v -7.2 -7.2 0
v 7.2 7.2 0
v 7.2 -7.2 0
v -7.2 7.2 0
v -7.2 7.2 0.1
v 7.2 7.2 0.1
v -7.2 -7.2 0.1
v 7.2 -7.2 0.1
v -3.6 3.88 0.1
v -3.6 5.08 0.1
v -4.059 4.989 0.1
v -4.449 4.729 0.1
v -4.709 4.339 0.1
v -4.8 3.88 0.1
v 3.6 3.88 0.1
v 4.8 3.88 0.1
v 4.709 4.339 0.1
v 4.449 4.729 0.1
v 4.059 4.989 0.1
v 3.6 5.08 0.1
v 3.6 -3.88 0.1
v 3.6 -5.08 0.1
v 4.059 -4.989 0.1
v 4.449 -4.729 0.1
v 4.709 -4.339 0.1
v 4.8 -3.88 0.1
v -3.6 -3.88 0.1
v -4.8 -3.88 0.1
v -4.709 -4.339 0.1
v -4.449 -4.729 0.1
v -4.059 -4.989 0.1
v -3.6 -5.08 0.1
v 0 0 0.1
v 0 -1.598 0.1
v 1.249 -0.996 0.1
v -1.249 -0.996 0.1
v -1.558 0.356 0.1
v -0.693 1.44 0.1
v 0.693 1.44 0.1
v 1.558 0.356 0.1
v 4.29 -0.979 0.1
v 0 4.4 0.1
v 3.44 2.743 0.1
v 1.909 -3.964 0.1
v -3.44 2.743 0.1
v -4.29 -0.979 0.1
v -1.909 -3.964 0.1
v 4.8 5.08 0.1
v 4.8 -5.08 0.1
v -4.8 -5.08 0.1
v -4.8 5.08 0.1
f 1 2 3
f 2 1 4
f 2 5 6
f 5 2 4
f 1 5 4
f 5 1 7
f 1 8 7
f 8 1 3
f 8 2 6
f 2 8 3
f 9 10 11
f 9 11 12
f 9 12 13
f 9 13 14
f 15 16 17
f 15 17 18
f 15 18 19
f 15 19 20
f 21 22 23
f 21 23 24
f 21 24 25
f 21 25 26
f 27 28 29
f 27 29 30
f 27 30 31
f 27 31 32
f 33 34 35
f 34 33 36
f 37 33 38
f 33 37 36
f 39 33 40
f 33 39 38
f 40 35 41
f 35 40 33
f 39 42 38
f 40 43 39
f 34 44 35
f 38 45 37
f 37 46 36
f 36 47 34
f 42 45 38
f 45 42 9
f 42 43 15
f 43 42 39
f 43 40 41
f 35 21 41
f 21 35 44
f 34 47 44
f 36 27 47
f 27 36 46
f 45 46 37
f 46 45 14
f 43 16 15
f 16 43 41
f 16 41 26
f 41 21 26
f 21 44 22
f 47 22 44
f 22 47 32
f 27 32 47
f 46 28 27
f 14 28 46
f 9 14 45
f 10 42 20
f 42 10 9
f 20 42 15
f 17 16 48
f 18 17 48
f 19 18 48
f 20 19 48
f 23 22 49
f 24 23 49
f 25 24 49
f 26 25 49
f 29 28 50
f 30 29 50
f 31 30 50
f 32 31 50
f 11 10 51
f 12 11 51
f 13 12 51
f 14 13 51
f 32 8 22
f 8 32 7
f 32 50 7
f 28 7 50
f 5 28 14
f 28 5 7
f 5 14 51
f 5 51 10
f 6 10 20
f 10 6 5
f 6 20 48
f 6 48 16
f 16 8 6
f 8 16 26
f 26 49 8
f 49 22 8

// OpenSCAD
// file: ../p/4-4edge.scad
use <../lib.scad>
$fa=1; $fs=0.2;
function ldraw_lib__4_4edge(realsolid=false) = [
// 0 Circle 1.0
// 0 Name: 4-4edge.dat
// 0 Author: James Jessiman
// 0 !LDRAW_ORG Primitive UPDATE 2017-01
// 0 !LICENSE Licensed under CC BY 2.0 and CC BY 4.0 : see CAreadme.txt
// 
// 0 BFC CERTIFY CCW
  [0,"BFC","CERTIFY"],
  [0,"BFC","CCW"],
// 
// 0 !HISTORY 1998-12-15 [PTadmin] Official Update 1998-10
// 0 !HISTORY 2005-12-28 [PTadmin] Official Update 2005-01
// 0 !HISTORY 2007-06-24 [PTadmin] Header formatted for Contributor Agreement
// 0 !HISTORY 2008-07-01 [PTadmin] Official Update 2008-01
// 0 !HISTORY 2017-01-15 [Steffen] BFCed
// 0 !HISTORY 2017-12-30 [PTadmin] Official Update 2017-01
// 
// 
// 2 24 1 0 0 0.9239 0 0.3827
  [2,24,1,0,0,0.9239,0,0.3827],
// 2 24 0.9239 0 0.3827 0.7071 0 0.7071
  [2,24,0.9239,0,0.3827,0.7071,0,0.7071],
// 2 24 0.7071 0 0.7071 0.3827 0 0.9239
  [2,24,0.7071,0,0.7071,0.3827,0,0.9239],
// 2 24 0.3827 0 0.9239 0 0 1
  [2,24,0.3827,0,0.9239,0,0,1],
// 2 24 0 0 1 -0.3827 0 0.9239
  [2,24,0,0,1,-0.3827,0,0.9239],
// 2 24 -0.3827 0 0.9239 -0.7071 0 0.7071
  [2,24,-0.3827,0,0.9239,-0.7071,0,0.7071],
// 2 24 -0.7071 0 0.7071 -0.9239 0 0.3827
  [2,24,-0.7071,0,0.7071,-0.9239,0,0.3827],
// 2 24 -0.9239 0 0.3827 -1 0 -0
  [2,24,-0.9239,0,0.3827,-1,0,-0],
// 2 24 -1 0 -0 -0.9239 0 -0.3827
  [2,24,-1,0,-0,-0.9239,0,-0.3827],
// 2 24 -0.9239 0 -0.3827 -0.7071 0 -0.7071
  [2,24,-0.9239,0,-0.3827,-0.7071,0,-0.7071],
// 2 24 -0.7071 0 -0.7071 -0.3827 0 -0.9239
  [2,24,-0.7071,0,-0.7071,-0.3827,0,-0.9239],
// 2 24 -0.3827 0 -0.9239 0 0 -1
  [2,24,-0.3827,0,-0.9239,0,0,-1],
// 2 24 0 0 -1 0.3827 0 -0.9239
  [2,24,0,0,-1,0.3827,0,-0.9239],
// 2 24 0.3827 0 -0.9239 0.7071 0 -0.7071
  [2,24,0.3827,0,-0.9239,0.7071,0,-0.7071],
// 2 24 0.7071 0 -0.7071 0.9239 0 -0.3827
  [2,24,0.7071,0,-0.7071,0.9239,0,-0.3827],
// 2 24 0.9239 0 -0.3827 1 0 0
  [2,24,0.9239,0,-0.3827,1,0,0],
];
module ldraw_lib__4_4edge(step=0, col=false, unit=2/5, alt=false, line=0.2, solid=!$preview)
    makepoly(ldraw_lib__4_4edge(solid), step=step, col=col, unit=unit, alt=alt, line=line, solid=solid);
ldraw_lib__4_4edge(line=0.2);
// file: ../p/4-4disc.scad
use <../lib.scad>
$fa=1; $fs=0.2;
function ldraw_lib__4_4disc(realsolid=false) = [
// 0 Disc 1.0
// 0 Name: 4-4disc.dat
// 0 Author: James Jessiman
// 0 !LDRAW_ORG Primitive UPDATE 2002-02
// 0 !LICENSE Licensed under CC BY 2.0 and CC BY 4.0 : see CAreadme.txt
// 
// 0 BFC CERTIFY CCW
  [0,"BFC","CERTIFY"],
  [0,"BFC","CCW"],
// 
// 0 !HISTORY 1998-12-15 [PTadmin] Official Update 1998-10
// 0 !HISTORY 2002-03-23 [sbliss] Added BFC statement
// 0 !HISTORY 2002-04-25 [PTadmin] Official Update 2002-02
// 0 !HISTORY 2007-06-24 [PTadmin] Header formatted for Contributor Agreement
// 0 !HISTORY 2008-07-01 [PTadmin] Official Update 2008-01
// 
// 
// 3 16 0 0 0 1 0 0 0.9239 0 0.3827
  [3,16,0,0,0,1,0,0,0.9239,0,0.3827],
// 3 16 0 0 0 0.9239 0 0.3827 0.7071 0 0.7071
  [3,16,0,0,0,0.9239,0,0.3827,0.7071,0,0.7071],
// 3 16 0 0 0 0.7071 0 0.7071 0.3827 0 0.9239
  [3,16,0,0,0,0.7071,0,0.7071,0.3827,0,0.9239],
// 3 16 0 0 0 0.3827 0 0.9239 0 0 1
  [3,16,0,0,0,0.3827,0,0.9239,0,0,1],
// 3 16 0 0 0 0 0 1 -0.3827 0 0.9239
  [3,16,0,0,0,0,0,1,-0.3827,0,0.9239],
// 3 16 0 0 0 -0.3827 0 0.9239 -0.7071 0 0.7071
  [3,16,0,0,0,-0.3827,0,0.9239,-0.7071,0,0.7071],
// 3 16 0 0 0 -0.7071 0 0.7071 -0.9239 0 0.3827
  [3,16,0,0,0,-0.7071,0,0.7071,-0.9239,0,0.3827],
// 3 16 0 0 0 -0.9239 0 0.3827 -1 0 -0
  [3,16,0,0,0,-0.9239,0,0.3827,-1,0,-0],
// 3 16 0 0 0 -1 0 -0 -0.9239 0 -0.3827
  [3,16,0,0,0,-1,0,-0,-0.9239,0,-0.3827],
// 3 16 0 0 0 -0.9239 0 -0.3827 -0.7071 0 -0.7071
  [3,16,0,0,0,-0.9239,0,-0.3827,-0.7071,0,-0.7071],
// 3 16 0 0 0 -0.7071 0 -0.7071 -0.3827 0 -0.9239
  [3,16,0,0,0,-0.7071,0,-0.7071,-0.3827,0,-0.9239],
// 3 16 0 0 0 -0.3827 0 -0.9239 0 0 -1
  [3,16,0,0,0,-0.3827,0,-0.9239,0,0,-1],
// 3 16 0 0 0 0 0 -1 0.3827 0 -0.9239
  [3,16,0,0,0,0,0,-1,0.3827,0,-0.9239],
// 3 16 0 0 0 0.3827 0 -0.9239 0.7071 0 -0.7071
  [3,16,0,0,0,0.3827,0,-0.9239,0.7071,0,-0.7071],
// 3 16 0 0 0 0.7071 0 -0.7071 0.9239 0 -0.3827
  [3,16,0,0,0,0.7071,0,-0.7071,0.9239,0,-0.3827],
// 3 16 0 0 0 0.9239 0 -0.3827 1 0 0
  [3,16,0,0,0,0.9239,0,-0.3827,1,0,0],
// 0
];
module ldraw_lib__4_4disc(step=0, col=false, unit=2/5, alt=false, line=0.2, solid=!$preview)
    makepoly(ldraw_lib__4_4disc(solid), step=step, col=col, unit=unit, alt=alt, line=line, solid=solid);
ldraw_lib__4_4disc(line=0.2);
// file: ../p/4-4cyli.scad
use <../lib.scad>
$fa=1; $fs=0.2;
function ldraw_lib__4_4cyli(realsolid=false) = [
// 0 Cylinder 1.0
// 0 Name: 4-4cyli.dat
// 0 Author: James Jessiman
// 0 !LDRAW_ORG Primitive UPDATE 2005-01
// 0 !LICENSE Licensed under CC BY 2.0 and CC BY 4.0 : see CAreadme.txt
// 
// 0 BFC CERTIFY CCW
  [0,"BFC","CERTIFY"],
  [0,"BFC","CCW"],
// 
// 0 !HISTORY 1998-12-15 [PTadmin] Official Update 1998-10
// 0 !HISTORY 2002-03-23 [sbliss] Added BFC statement; merged headers from files in distributions LDraw 0.27 and Complete.
// 0 !HISTORY 2002-04-25 [PTadmin] Official Update 2002-02
// 0 !HISTORY 2004-12-14 [guyvivan] BFC CCW
// 0 !HISTORY 2005-12-28 [PTadmin] Official Update 2005-01
// 0 !HISTORY 2007-06-24 [PTadmin] Header formatted for Contributor Agreement
// 0 !HISTORY 2008-07-01 [PTadmin] Official Update 2008-01
// 
// 
// 4 16 1 1 0 0.9239 1 0.3827 0.9239 0 0.3827 1 0 0
  [4,16,1,1,0,0.9239,1,0.3827,0.9239,0,0.3827,1,0,0],
// 5 24 1 0 0 1 1 0 0.9239 0 0.3827 0.9239 0 -0.3827
  [5,24,1,0,0,1,1,0,0.9239,0,0.3827,0.9239,0,-0.3827],
// 4 16 0.9239 1 0.3827 0.7071 1 0.7071 0.7071 0 0.7071 0.9239 0 0.3827
  [4,16,0.9239,1,0.3827,0.7071,1,0.7071,0.7071,0,0.7071,0.9239,0,0.3827],
// 5 24 0.9239 0 0.3827 0.9239 1 0.3827 0.7071 0 0.7071 1 0 0
  [5,24,0.9239,0,0.3827,0.9239,1,0.3827,0.7071,0,0.7071,1,0,0],
// 4 16 0.7071 1 0.7071 0.3827 1 0.9239 0.3827 0 0.9239 0.7071 0 0.7071
  [4,16,0.7071,1,0.7071,0.3827,1,0.9239,0.3827,0,0.9239,0.7071,0,0.7071],
// 5 24 0.7071 0 0.7071 0.7071 1 0.7071 0.3827 0 0.9239 0.9239 0 0.3827
  [5,24,0.7071,0,0.7071,0.7071,1,0.7071,0.3827,0,0.9239,0.9239,0,0.3827],
// 4 16 0.3827 1 0.9239 0 1 1 0 0 1 0.3827 0 0.9239
  [4,16,0.3827,1,0.9239,0,1,1,0,0,1,0.3827,0,0.9239],
// 5 24 0.3827 0 0.9239 0.3827 1 0.9239 0 0 1 0.7071 0 0.7071
  [5,24,0.3827,0,0.9239,0.3827,1,0.9239,0,0,1,0.7071,0,0.7071],
// 4 16 0 1 1 -0.3827 1 0.9239 -0.3827 0 0.9239 0 0 1
  [4,16,0,1,1,-0.3827,1,0.9239,-0.3827,0,0.9239,0,0,1],
// 5 24 0 0 1 0 1 1 -0.3827 0 0.9239 0.3827 0 0.9239
  [5,24,0,0,1,0,1,1,-0.3827,0,0.9239,0.3827,0,0.9239],
// 4 16 -0.3827 1 0.9239 -0.7071 1 0.7071 -0.7071 0 0.7071 -0.3827 0 0.9239
  [4,16,-0.3827,1,0.9239,-0.7071,1,0.7071,-0.7071,0,0.7071,-0.3827,0,0.9239],
// 5 24 -0.3827 0 0.9239 -0.3827 1 0.9239 -0.7071 0 0.7071 0 0 1
  [5,24,-0.3827,0,0.9239,-0.3827,1,0.9239,-0.7071,0,0.7071,0,0,1],
// 4 16 -0.7071 1 0.7071 -0.9239 1 0.3827 -0.9239 0 0.3827 -0.7071 0 0.7071
  [4,16,-0.7071,1,0.7071,-0.9239,1,0.3827,-0.9239,0,0.3827,-0.7071,0,0.7071],
// 5 24 -0.7071 0 0.7071 -0.7071 1 0.7071 -0.9239 0 0.3827 -0.3827 0 0.9239
  [5,24,-0.7071,0,0.7071,-0.7071,1,0.7071,-0.9239,0,0.3827,-0.3827,0,0.9239],
// 4 16 -0.9239 1 0.3827 -1 1 0 -1 0 0 -0.9239 0 0.3827
  [4,16,-0.9239,1,0.3827,-1,1,0,-1,0,0,-0.9239,0,0.3827],
// 5 24 -0.9239 0 0.3827 -0.9239 1 0.3827 -1 0 0 -0.7071 0 0.7071
  [5,24,-0.9239,0,0.3827,-0.9239,1,0.3827,-1,0,0,-0.7071,0,0.7071],
// 4 16 -1 1 0 -0.9239 1 -0.3827 -0.9239 0 -0.3827 -1 0 0
  [4,16,-1,1,0,-0.9239,1,-0.3827,-0.9239,0,-0.3827,-1,0,0],
// 5 24 -1 0 0 -1 1 0 -0.9239 0 -0.3827 -0.9239 0 0.3827
  [5,24,-1,0,0,-1,1,0,-0.9239,0,-0.3827,-0.9239,0,0.3827],
// 4 16 -0.9239 1 -0.3827 -0.7071 1 -0.7071 -0.7071 0 -0.7071 -0.9239 0 -0.3827
  [4,16,-0.9239,1,-0.3827,-0.7071,1,-0.7071,-0.7071,0,-0.7071,-0.9239,0,-0.3827],
// 5 24 -0.9239 0 -0.3827 -0.9239 1 -0.3827 -0.7071 0 -0.7071 -1 0 0
  [5,24,-0.9239,0,-0.3827,-0.9239,1,-0.3827,-0.7071,0,-0.7071,-1,0,0],
// 4 16 -0.7071 1 -0.7071 -0.3827 1 -0.9239 -0.3827 0 -0.9239 -0.7071 0 -0.7071
  [4,16,-0.7071,1,-0.7071,-0.3827,1,-0.9239,-0.3827,0,-0.9239,-0.7071,0,-0.7071],
// 5 24 -0.7071 0 -0.7071 -0.7071 1 -0.7071 -0.3827 0 -0.9239 -0.9239 0 -0.3827
  [5,24,-0.7071,0,-0.7071,-0.7071,1,-0.7071,-0.3827,0,-0.9239,-0.9239,0,-0.3827],
// 4 16 -0.3827 1 -0.9239 0 1 -1 0 0 -1 -0.3827 0 -0.9239
  [4,16,-0.3827,1,-0.9239,0,1,-1,0,0,-1,-0.3827,0,-0.9239],
// 5 24 -0.3827 0 -0.9239 -0.3827 1 -0.9239 0 0 -1 -0.7071 0 -0.7071
  [5,24,-0.3827,0,-0.9239,-0.3827,1,-0.9239,0,0,-1,-0.7071,0,-0.7071],
// 4 16 0 1 -1 0.3827 1 -0.9239 0.3827 0 -0.9239 0 0 -1
  [4,16,0,1,-1,0.3827,1,-0.9239,0.3827,0,-0.9239,0,0,-1],
// 5 24 0 0 -1 0 1 -1 0.3827 0 -0.9239 -0.3827 0 -0.9239
  [5,24,0,0,-1,0,1,-1,0.3827,0,-0.9239,-0.3827,0,-0.9239],
// 4 16 0.3827 1 -0.9239 0.7071 1 -0.7071 0.7071 0 -0.7071 0.3827 0 -0.9239
  [4,16,0.3827,1,-0.9239,0.7071,1,-0.7071,0.7071,0,-0.7071,0.3827,0,-0.9239],
// 5 24 0.3827 0 -0.9239 0.3827 1 -0.9239 0.7071 0 -0.7071 0 0 -1
  [5,24,0.3827,0,-0.9239,0.3827,1,-0.9239,0.7071,0,-0.7071,0,0,-1],
// 4 16 0.7071 1 -0.7071 0.9239 1 -0.3827 0.9239 0 -0.3827 0.7071 0 -0.7071
  [4,16,0.7071,1,-0.7071,0.9239,1,-0.3827,0.9239,0,-0.3827,0.7071,0,-0.7071],
// 5 24 0.7071 0 -0.7071 0.7071 1 -0.7071 0.9239 0 -0.3827 0.3827 0 -0.9239
  [5,24,0.7071,0,-0.7071,0.7071,1,-0.7071,0.9239,0,-0.3827,0.3827,0,-0.9239],
// 4 16 0.9239 1 -0.3827 1 1 0 1 0 0 0.9239 0 -0.3827
  [4,16,0.9239,1,-0.3827,1,1,0,1,0,0,0.9239,0,-0.3827],
// 5 24 0.9239 0 -0.3827 0.9239 1 -0.3827 1 0 0 0.7071 0 -0.7071
  [5,24,0.9239,0,-0.3827,0.9239,1,-0.3827,1,0,0,0.7071,0,-0.7071],
// 0
];
module ldraw_lib__4_4cyli(step=0, col=false, unit=2/5, alt=false, line=0.2, solid=!$preview)
    makepoly(ldraw_lib__4_4cyli(solid), step=step, col=col, unit=unit, alt=alt, line=line, solid=solid);
ldraw_lib__4_4cyli(line=0.2);
// file: ../p/stud3.scad
use <../lib.scad>
use <4-4cyli.scad>
use <4-4disc.scad>
use <4-4edge.scad>
$fa=1; $fs=0.2;
function ldraw_lib__stud3(realsolid=false) = realsolid ? 
    [openscad(translate([0,0,-eps()], o=cylinder(4+eps(), r=4)),2)] : [
// 0 Stud Tube Solid
// 0 Name: stud3.dat
// 0 Author: James Jessiman
// 0 !LDRAW_ORG Primitive UPDATE 2012-01
// 0 !LICENSE Licensed under CC BY 2.0 and CC BY 4.0 : see CAreadme.txt
// 
// 0 BFC CERTIFY CCW
  [0,"BFC","CERTIFY"],
  [0,"BFC","CCW"],
// 
// 0 !HISTORY 2002-04-04 [sbliss] Modified for BFC compliance
// 0 !HISTORY 2002-04-25 [PTadmin] Official Update 2002-02
// 0 !HISTORY 2007-06-24 [PTadmin] Header formatted for Contributor Agreement
// 0 !HISTORY 2008-07-01 [PTadmin] Official Update 2008-01
// 0 !HISTORY 2012-02-16 [Philo] Changed to CCW
// 0 !HISTORY 2012-03-30 [PTadmin] Official Update 2012-01
// 
// 
// 1 16 0 -4 0 4 0 0 0 1 0 0 0 4 4-4edge.dat
  [1,16,0,-4,0,4,0,0,0,1,0,0,0,4, ldraw_lib__4_4edge(realsolid)],
// 1 16 0 0 0 4 0 0 0 1 0 0 0 4 4-4edge.dat
  [1,16,0,0,0,4,0,0,0,1,0,0,0,4, ldraw_lib__4_4edge(realsolid)],
// 1 16 0 -4 0 4 0 0 0 1 0 0 0 4 4-4disc.dat
  [1,16,0,-4,0,4,0,0,0,1,0,0,0,4, ldraw_lib__4_4disc(realsolid)],
// 1 16 0 -4 0 4 0 0 0 4 0 0 0 4 4-4cyli.dat
  [1,16,0,-4,0,4,0,0,0,4,0,0,0,4, ldraw_lib__4_4cyli(realsolid)],
];
module ldraw_lib__stud3(step=0, col=false, unit=2/5, alt=false, line=0.2, solid=!$preview)
    makepoly(ldraw_lib__stud3(solid), step=step, col=col, unit=unit, alt=alt, line=line, solid=solid);
ldraw_lib__stud3(line=0.2);
// file: ../p/stud.scad
use <../lib.scad>
use <4-4cyli.scad>
use <4-4disc.scad>
use <4-4edge.scad>
$fa=1; $fs=0.2;
function ldraw_lib__stud(realsolid=false) = realsolid ? 
    [openscad(translate([0,0,-eps()], o=cylinder(4+eps(), r=6)),2)] : [
// 0 Stud
// 0 Name: stud.dat
// 0 Author: James Jessiman
// 0 !LDRAW_ORG Primitive UPDATE 2012-01
// 0 !LICENSE Licensed under CC BY 2.0 and CC BY 4.0 : see CAreadme.txt
// 
// 0 BFC CERTIFY CCW
  [0,"BFC","CERTIFY"],
  [0,"BFC","CCW"],
// 
// 0 !HISTORY 2002-04-04 [sbliss] Modified for BFC compliance
// 0 !HISTORY 2002-04-25 [PTadmin] Official Update 2002-02
// 0 !HISTORY 2007-06-24 [PTadmin] Header formatted for Contributor Agreement
// 0 !HISTORY 2008-07-01 [PTadmin] Official Update 2008-01
// 0 !HISTORY 2012-02-16 [Philo] Changed to CCW
// 0 !HISTORY 2012-03-30 [PTadmin] Official Update 2012-01
// 
// 
// 1 16 0 0 0 6 0 0 0 1 0 0 0 6 4-4edge.dat
  [1,16,0,0,0,6,0,0,0,1,0,0,0,6, ldraw_lib__4_4edge(realsolid)],
// 1 16 0 -4 0 6 0 0 0 1 0 0 0 6 4-4edge.dat
  [1,16,0,-4,0,6,0,0,0,1,0,0,0,6, ldraw_lib__4_4edge(realsolid)],
// 1 16 0 0 0 6 0 0 0 -4 0 0 0 6 4-4cyli.dat
  [1,16,0,0,0,6,0,0,0,-4,0,0,0,6, ldraw_lib__4_4cyli(realsolid)],
// 1 16 0 -4 0 6 0 0 0 1 0 0 0 6 4-4disc.dat
  [1,16,0,-4,0,6,0,0,0,1,0,0,0,6, ldraw_lib__4_4disc(realsolid)],
];
module ldraw_lib__stud(step=0, col=false, unit=2/5, alt=false, line=0.2, solid=!$preview)
    makepoly(ldraw_lib__stud(solid), step=step, col=col, unit=unit, alt=alt, line=line, solid=solid);
ldraw_lib__stud(line=0.2);
// file: ../p/box5.scad
use <../lib.scad>
$fa=1; $fs=0.2;
function ldraw_lib__box5(realsolid=false) = [
// 0 Box with 5 Faces and All Edges
// 0 Name: box5.dat
// 0 Author: James Jessiman
// 0 !LDRAW_ORG Primitive UPDATE 2012-01
// 0 !LICENSE Licensed under CC BY 2.0 and CC BY 4.0 : see CAreadme.txt
// 
// 0 BFC CERTIFY CCW
  [0,"BFC","CERTIFY"],
  [0,"BFC","CCW"],
// 
// 0 !HISTORY 2002-04-03 [sbliss] Modified for BFC compliance
// 0 !HISTORY 2002-04-25 [PTadmin] Official Update 2002-02
// 0 !HISTORY 2007-06-24 [PTadmin] Header formatted for Contributor Agreement
// 0 !HISTORY 2008-07-01 [PTadmin] Official Update 2008-01
// 0 !HISTORY 2012-02-16 [Philo] Changed to CCW
// 0 !HISTORY 2012-03-30 [PTadmin] Official Update 2012-01
// 
// 
// 2 24 1 1 1 -1 1 1
  [2,24,1,1,1,-1,1,1],
// 2 24 -1 1 1 -1 1 -1
  [2,24,-1,1,1,-1,1,-1],
// 2 24 -1 1 -1 1 1 -1
  [2,24,-1,1,-1,1,1,-1],
// 2 24 1 1 -1 1 1 1
  [2,24,1,1,-1,1,1,1],
// 2 24 1 0 1 -1 0 1
  [2,24,1,0,1,-1,0,1],
// 2 24 -1 0 1 -1 0 -1
  [2,24,-1,0,1,-1,0,-1],
// 2 24 -1 0 -1 1 0 -1
  [2,24,-1,0,-1,1,0,-1],
// 2 24 1 0 -1 1 0 1
  [2,24,1,0,-1,1,0,1],
// 2 24 1 0 1 1 1 1
  [2,24,1,0,1,1,1,1],
// 2 24 -1 0 1 -1 1 1
  [2,24,-1,0,1,-1,1,1],
// 2 24 1 0 -1 1 1 -1
  [2,24,1,0,-1,1,1,-1],
// 2 24 -1 0 -1 -1 1 -1
  [2,24,-1,0,-1,-1,1,-1],
// 4 16 -1 1 1 1 1 1 1 1 -1 -1 1 -1
  [4,16,-1,1,1,1,1,1,1,1,-1,-1,1,-1],
// 4 16 -1 1 1 -1 0 1 1 0 1 1 1 1
  [4,16,-1,1,1,-1,0,1,1,0,1,1,1,1],
// 4 16 -1 1 -1 -1 0 -1 -1 0 1 -1 1 1
  [4,16,-1,1,-1,-1,0,-1,-1,0,1,-1,1,1],
// 4 16 1 1 -1 1 0 -1 -1 0 -1 -1 1 -1
  [4,16,1,1,-1,1,0,-1,-1,0,-1,-1,1,-1],
// 4 16 1 1 1 1 0 1 1 0 -1 1 1 -1
  [4,16,1,1,1,1,0,1,1,0,-1,1,1,-1],
];
module ldraw_lib__box5(step=0, col=false, unit=2/5, alt=false, line=0.2, solid=!$preview)
    makepoly(ldraw_lib__box5(solid), step=step, col=col, unit=unit, alt=alt, line=line, solid=solid);
ldraw_lib__box5(line=0.2);
// file: ../p/box4t.scad
use <../lib.scad>
$fa=1; $fs=0.2;
function ldraw_lib__box4t(realsolid=false) = [
// 0 Box with 4 Adjacent Faces and All Edges
// 0 Name: box4t.dat
// 0 Author: Tore Eriksson [Tore_Eriksson]
// 0 !LDRAW_ORG Primitive UPDATE 2003-02
// 0 !LICENSE Licensed under CC BY 2.0 and CC BY 4.0 : see CAreadme.txt
// 
// 0 BFC CERTIFY CCW
  [0,"BFC","CERTIFY"],
  [0,"BFC","CCW"],
// 
// 0 !HISTORY 1997-09-29 [PTadmin] Official Update 1997-15
// 0 !HISTORY 2002-08-31 [izanette] Modified with WINDZ for BFC compliance
// 0 !HISTORY 2003-08-01 [PTadmin] Official Update 2003-02
// 0 !HISTORY 2007-06-24 [PTadmin] Header formatted for Contributor Agreement
// 0 !HISTORY 2008-07-01 [PTadmin] Official Update 2008-01
// 
// 
// 2 24 1 1 1 -1 1 1
  [2,24,1,1,1,-1,1,1],
// 2 24 -1 1 1 -1 1 -1
  [2,24,-1,1,1,-1,1,-1],
// 2 24 -1 1 -1 1 1 -1
  [2,24,-1,1,-1,1,1,-1],
// 2 24 1 1 -1 1 1 1
  [2,24,1,1,-1,1,1,1],
// 2 24 1 0 1 -1 0 1
  [2,24,1,0,1,-1,0,1],
// 2 24 -1 0 1 -1 0 -1
  [2,24,-1,0,1,-1,0,-1],
// 2 24 -1 0 -1 1 0 -1
  [2,24,-1,0,-1,1,0,-1],
// 2 24 1 0 -1 1 0 1
  [2,24,1,0,-1,1,0,1],
// 2 24 1 0 1 1 1 1
  [2,24,1,0,1,1,1,1],
// 2 24 -1 0 1 -1 1 1
  [2,24,-1,0,1,-1,1,1],
// 2 24 1 0 -1 1 1 -1
  [2,24,1,0,-1,1,1,-1],
// 2 24 -1 0 -1 -1 1 -1
  [2,24,-1,0,-1,-1,1,-1],
// 4 16 1 1 1 1 1 -1 -1 1 -1 -1 1 1
  [4,16,1,1,1,1,1,-1,-1,1,-1,-1,1,1],
// 4 16 1 1 1 -1 1 1 -1 0 1 1 0 1
  [4,16,1,1,1,-1,1,1,-1,0,1,1,0,1],
// 4 16 -1 1 1 -1 1 -1 -1 0 -1 -1 0 1
  [4,16,-1,1,1,-1,1,-1,-1,0,-1,-1,0,1],
// 0 4 16 -1 1 -1 -1 0 -1 1 0 -1 1 1 -1
// 4 16 1 1 -1 1 1 1 1 0 1 1 0 -1
  [4,16,1,1,-1,1,1,1,1,0,1,1,0,-1],
// 0
];
module ldraw_lib__box4t(step=0, col=false, unit=2/5, alt=false, line=0.2, solid=!$preview)
    makepoly(ldraw_lib__box4t(solid), step=step, col=col, unit=unit, alt=alt, line=line, solid=solid);
ldraw_lib__box4t(line=0.2);
// file: s/3004s01.scad
use <../../lib.scad>
use <../../p/box4t.scad>
use <../../p/box5.scad>
use <../../p/stud.scad>
use <../../p/stud3.scad>
$fa=1; $fs=0.2;
function ldraw_lib__s__3004s01(realsolid=false) = [
// 0 ~Brick  1 x  2 without Front Face
// 0 Name: s\3004s01.dat
// 0 Author: James Jessiman
// 0 !LDRAW_ORG Subpart UPDATE 2003-03
// 0 !LICENSE Licensed under CC BY 2.0 and CC BY 4.0 : see CAreadme.txt
// 
// 0 BFC CERTIFY CCW
  [0,"BFC","CERTIFY"],
  [0,"BFC","CCW"],
// 
// 0 !HISTORY 2003-09-07 [jriley] Subfiling, BFC
// 0 !HISTORY 2003-12-19 [PTadmin] Official Update 2003-03
// 0 !HISTORY 2007-08-29 [PTadmin] Header formatted for Contributor Agreement
// 0 !HISTORY 2008-07-01 [PTadmin] Official Update 2008-01
// 
// 
// 1 16 0 4 0 1 0 0 0 -5 0 0 0 1 stud3.dat
  [1,16,0,4,0,1,0,0,0,-5,0,0,0,1, ldraw_lib__stud3(realsolid)],
// 0 BFC INVERTNEXT
  [0,"BFC","INVERTNEXT"],
// 1 16 0 24 0 16 0 0 0 -20 0 0 0 6 box5.dat
  [1,16,0,24,0,16,0,0,0,-20,0,0,0,6, ldraw_lib__box5(realsolid)],
// 4 16 20 24 10 16 24 6 -16 24 6 -20 24 10
  [4,16,20,24,10,16,24,6,-16,24,6,-20,24,10],
// 4 16 -20 24 10 -16 24 6 -16 24 -6 -20 24 -10
  [4,16,-20,24,10,-16,24,6,-16,24,-6,-20,24,-10],
// 4 16 -20 24 -10 -16 24 -6 16 24 -6 20 24 -10
  [4,16,-20,24,-10,-16,24,-6,16,24,-6,20,24,-10],
// 4 16 20 24 -10 16 24 -6 16 24 6 20 24 10
  [4,16,20,24,-10,16,24,-6,16,24,6,20,24,10],
// 1 16 0 24 0 20 0 0 0 -24 0 0 0 10 box4t.dat
  [1,16,0,24,0,20,0,0,0,-24,0,0,0,10, ldraw_lib__box4t(realsolid)],
// 1 16 10 0 0 1 0 0 0 1 0 0 0 1 stud.dat
  [1,16,10,0,0,1,0,0,0,1,0,0,0,1, ldraw_lib__stud(realsolid)],
// 1 16 -10 0 0 1 0 0 0 1 0 0 0 1 stud.dat
  [1,16,-10,0,0,1,0,0,0,1,0,0,0,1, ldraw_lib__stud(realsolid)],
// 0
];
module ldraw_lib__s__3004s01(step=0, col=false, unit=2/5, alt=false, line=0.2, solid=!$preview)
    makepoly(ldraw_lib__s__3004s01(solid), step=step, col=col, unit=unit, alt=alt, line=line, solid=solid);
ldraw_lib__s__3004s01(line=0.2);
// file: ../p/1-4ndis.scad
use <../lib.scad>
$fa=1; $fs=0.2;
function ldraw_lib__1_4ndis(realsolid=false) = [
// 0 Disc Negative 0.25
// 0 Name: 1-4ndis.dat
// 0 Author: James Jessiman
// 0 !LDRAW_ORG Primitive UPDATE 2012-01
// 0 !LICENSE Licensed under CC BY 2.0 and CC BY 4.0 : see CAreadme.txt
// 
// 0 BFC CERTIFY CCW
  [0,"BFC","CERTIFY"],
  [0,"BFC","CCW"],
// 
// 0 !HISTORY 2002-03-23 [sbliss] Added BFC Statement
// 0 !HISTORY 2002-04-25 [PTadmin] Official Update 2002-02
// 0 !HISTORY 2007-06-22 [PTadmin] Header formatted for Contributor Agreement
// 0 !HISTORY 2008-07-01 [PTadmin] Official Update 2008-01
// 0 !HISTORY 2012-02-16 [Philo] Changed to CCW
// 0 !HISTORY 2012-03-30 [PTadmin] Official Update 2012-01
// 
// 
// 3 16 0.9239 0 0.3827 1 0 0 1 0 1
  [3,16,0.9239,0,0.3827,1,0,0,1,0,1],
// 3 16 0.7071 0 0.7071 0.9239 0 0.3827 1 0 1
  [3,16,0.7071,0,0.7071,0.9239,0,0.3827,1,0,1],
// 3 16 0.3827 0 0.9239 0.7071 0 0.7071 1 0 1
  [3,16,0.3827,0,0.9239,0.7071,0,0.7071,1,0,1],
// 3 16 0 0 1 0.3827 0 0.9239 1 0 1
  [3,16,0,0,1,0.3827,0,0.9239,1,0,1],
];
module ldraw_lib__1_4ndis(step=0, col=false, unit=2/5, alt=false, line=0.2, solid=!$preview)
    makepoly(ldraw_lib__1_4ndis(solid), step=step, col=col, unit=unit, alt=alt, line=line, solid=solid);
ldraw_lib__1_4ndis(line=0.2);
// file: ../p/1-4disc.scad
use <../lib.scad>
$fa=1; $fs=0.2;
function ldraw_lib__1_4disc(realsolid=false) = [
// 0 Disc 0.25
// 0 Name: 1-4disc.dat
// 0 Author: James Jessiman
// 0 !LDRAW_ORG Primitive UPDATE 2002-02
// 0 !LICENSE Licensed under CC BY 2.0 and CC BY 4.0 : see CAreadme.txt
// 
// 0 BFC CERTIFY CCW
  [0,"BFC","CERTIFY"],
  [0,"BFC","CCW"],
// 
// 0 !HISTORY 2002-03-23 [sbliss] Added BFC statement.
// 0 !HISTORY 2002-04-25 [PTadmin] Official Update 2002-02
// 0 !HISTORY 2007-06-22 [PTadmin] Header formatted for Contributor Agreement
// 0 !HISTORY 2008-07-01 [PTadmin] Official Update 2008-01
// 
// 
// 3 16 0 0 0 1 0 0 0.9239 0 0.3827
  [3,16,0,0,0,1,0,0,0.9239,0,0.3827],
// 3 16 0 0 0 0.9239 0 0.3827 0.7071 0 0.7071
  [3,16,0,0,0,0.9239,0,0.3827,0.7071,0,0.7071],
// 3 16 0 0 0 0.7071 0 0.7071 0.3827 0 0.9239
  [3,16,0,0,0,0.7071,0,0.7071,0.3827,0,0.9239],
// 3 16 0 0 0 0.3827 0 0.9239 0 0 1
  [3,16,0,0,0,0.3827,0,0.9239,0,0,1],
// 0
];
module ldraw_lib__1_4disc(step=0, col=false, unit=2/5, alt=false, line=0.2, solid=!$preview)
    makepoly(ldraw_lib__1_4disc(solid), step=step, col=col, unit=unit, alt=alt, line=line, solid=solid);
ldraw_lib__1_4disc(line=0.2);
// file: 3004.scad
use <../lib.scad>
use <s/3004s01.scad>
$fa=1; $fs=0.2;
function ldraw_lib__3004(realsolid=false) = [
// 0 Brick  1 x  2
// 0 Name: 3004.dat
// 0 Author: James Jessiman
// 0 !LDRAW_ORG Part UPDATE 2022-05
// 0 !LICENSE Licensed under CC BY 2.0 and CC BY 4.0 : see CAreadme.txt
// 
// 0 BFC CERTIFY CCW
  [0,"BFC","CERTIFY"],
  [0,"BFC","CCW"],
// 
// 0 !HISTORY 2001-10-26 [PTadmin] Official Update 2001-01
// 0 !HISTORY 2002-05-07 {unknown} BFC Certification
// 0 !HISTORY 2002-06-11 [PTadmin] Official Update 2002-03
// 0 !HISTORY 2007-05-07 [PTadmin] Header formatted for Contributor Agreement
// 0 !HISTORY 2008-07-01 [PTadmin] Official Update 2008-01
// 0 !HISTORY 2022-08-04 [MagFors] Using subfile
// 0 !HISTORY 2022-09-15 [PTadmin] Official Update 2022-05
// 
// 
// 1 16 0 0 0 1 0 0 0 1 0 0 0 1 s\3004s01.dat
  [1,16,0,0,0,1,0,0,0,1,0,0,0,1, ldraw_lib__s__3004s01(realsolid)],
// 4 16 -20 24 -10 20 24 -10 20 0 -10 -20 0 -10
  [4,16,-20,24,-10,20,24,-10,20,0,-10,-20,0,-10],
];
module ldraw_lib__3004(step=0, col=false, unit=2/5, alt=false, line=0.2, solid=!$preview)
    makepoly(ldraw_lib__3004(solid), step=step, col=col, unit=unit, alt=alt, line=line, solid=solid);
ldraw_lib__3004(line=0.2);
// file: s/4616559ps1.scad
use <../../lib.scad>
use <../../p/1-4disc.scad>
use <../../p/1-4ndis.scad>
$fa=1; $fs=0.2;
function ldraw_lib__s__4616559ps1(realsolid=false) = [
// 0 ~Sticker Maersk Logo
// 0 Name: s\4616559ps1.dat
// 0 Author: J.C. Tchang [tchang]
// 0 !LDRAW_ORG Subpart UPDATE 2013-01
// 0 !LICENSE Licensed under CC BY 2.0 and CC BY 4.0 : see CAreadme.txt
// 
// 0 BFC CERTIFY CCW
  [0,"BFC","CERTIFY"],
  [0,"BFC","CCW"],
// 
// 0 !HISTORY 2013-07-21 [PTadmin] Official Update 2013-01
// 
// 
// 1 313 -9 0 9.7 0 0 -3 0 1 0 3 0 0 1-4disc.dat
  [1,313,-9,0,9.7,0,0,-3,0,1,0,3,0,0, ldraw_lib__1_4disc(realsolid)],
// 1 313 9 0 9.7 3 0 0 0 1 0 0 0 3 1-4disc.dat
  [1,313,9,0,9.7,3,0,0,0,1,0,0,0,3, ldraw_lib__1_4disc(realsolid)],
// 1 313 9 0 -9.7 0 0 3 0 1 0 -3 0 0 1-4disc.dat
  [1,313,9,0,-9.7,0,0,3,0,1,0,-3,0,0, ldraw_lib__1_4disc(realsolid)],
// 1 313 -9 0 -9.7 -3 0 0 0 1 0 0 0 -3 1-4disc.dat
  [1,313,-9,0,-9.7,-3,0,0,0,1,0,0,0,-3, ldraw_lib__1_4disc(realsolid)],
// 0 //
// 4 15 0 0 -3.994 3.123 0 -2.49 0 0 0 -3.123 0 -2.49
  [4,15,0,0,-3.994,3.123,0,-2.49,0,0,0,-3.123,0,-2.49],
// 4 15 -3.894 0 0.889 -3.123 0 -2.49 0 0 0 -1.733 0 3.599
  [4,15,-3.894,0,0.889,-3.123,0,-2.49,0,0,0,-1.733,0,3.599],
// 4 15 1.733 0 3.599 -1.733 0 3.599 0 0 0 3.894 0 0.889
  [4,15,1.733,0,3.599,-1.733,0,3.599,0,0,0,3.894,0,0.889],
// 4 15 3.894 0 0.889 0 0 0 3.123 0 -2.49 10.724 0 -2.448
  [4,15,3.894,0,0.889,0,0,0,3.123,0,-2.49,10.724,0,-2.448],
// 3 15 1.733 0 3.599 0 0 11 -1.733 0 3.599
  [3,15,1.733,0,3.599,0,0,11,-1.733,0,3.599],
// 3 15 3.894 0 0.889 8.6 0 6.858 1.733 0 3.599
  [3,15,3.894,0,0.889,8.6,0,6.858,1.733,0,3.599],
// 3 15 0 0 -3.994 4.773 0 -9.911 3.123 0 -2.49
  [3,15,0,0,-3.994,4.773,0,-9.911,3.123,0,-2.49],
// 3 15 -1.733 0 3.599 -8.6 0 6.858 -3.894 0 0.889
  [3,15,-1.733,0,3.599,-8.6,0,6.858,-3.894,0,0.889],
// 3 15 -3.894 0 0.889 -10.724 0 -2.448 -3.123 0 -2.49
  [3,15,-3.894,0,0.889,-10.724,0,-2.448,-3.123,0,-2.49],
// 3 15 -3.123 0 -2.49 -4.773 0 -9.911 0 0 -3.994
  [3,15,-3.123,0,-2.49,-4.773,0,-9.911,0,0,-3.994],
// 0 //
// 4 313 -8.6 0 6.858 -1.733 0 3.599 0 0 11 -9 0 9.7
  [4,313,-8.6,0,6.858,-1.733,0,3.599,0,0,11,-9,0,9.7],
// 4 313 0 0 11 1.733 0 3.599 8.6 0 6.858 9 0 9.7
  [4,313,0,0,11,1.733,0,3.599,8.6,0,6.858,9,0,9.7],
// 3 313 8.6 0 6.858 3.894 0 0.889 10.724 0 -2.448
  [3,313,8.6,0,6.858,3.894,0,0.889,10.724,0,-2.448],
// 4 313 10.724 0 -2.448 3.123 0 -2.49 4.773 0 -9.911 9 0 -9.7
  [4,313,10.724,0,-2.448,3.123,0,-2.49,4.773,0,-9.911,9,0,-9.7],
// 3 313 0 0 -3.994 -4.773 0 -9.911 4.773 0 -9.911
  [3,313,0,0,-3.994,-4.773,0,-9.911,4.773,0,-9.911],
// 4 313 -4.773 0 -9.911 -3.123 0 -2.49 -10.724 0 -2.448 -9 0 -9.7
  [4,313,-4.773,0,-9.911,-3.123,0,-2.49,-10.724,0,-2.448,-9,0,-9.7],
// 4 313 -10.724 0 -2.448 -3.894 0 0.889 -8.6 0 6.858 -12 0 9.7
  [4,313,-10.724,0,-2.448,-3.894,0,0.889,-8.6,0,6.858,-12,0,9.7],
// 4 313 9 0 9.7 8.6 0 6.858 10.724 0 -2.448 12 0 9.7
  [4,313,9,0,9.7,8.6,0,6.858,10.724,0,-2.448,12,0,9.7],
// 3 313 12 0 9.7 10.724 0 -2.448 12 0 -9.7
  [3,313,12,0,9.7,10.724,0,-2.448,12,0,-9.7],
// 3 313 10.724 0 -2.448 9 0 -9.7 12 0 -9.7
  [3,313,10.724,0,-2.448,9,0,-9.7,12,0,-9.7],
// 3 313 9 0 -9.7 4.773 0 -9.911 9 0 -12.7
  [3,313,9,0,-9.7,4.773,0,-9.911,9,0,-12.7],
// 4 313 9 0 -12.7 4.773 0 -9.911 -4.773 0 -9.911 -9 0 -12.7
  [4,313,9,0,-12.7,4.773,0,-9.911,-4.773,0,-9.911,-9,0,-12.7],
// 3 313 -9 0 -9.7 -9 0 -12.7 -4.773 0 -9.911
  [3,313,-9,0,-9.7,-9,0,-12.7,-4.773,0,-9.911],
// 3 313 -10.724 0 -2.448 -12 0 -9.7 -9 0 -9.7
  [3,313,-10.724,0,-2.448,-12,0,-9.7,-9,0,-9.7],
// 3 313 -12 0 9.7 -12 0 -9.7 -10.724 0 -2.448
  [3,313,-12,0,9.7,-12,0,-9.7,-10.724,0,-2.448],
// 3 313 -9 0 9.7 -12 0 9.7 -8.6 0 6.858
  [3,313,-9,0,9.7,-12,0,9.7,-8.6,0,6.858],
// 4 313 -9 0 12.7 -9 0 9.7 0 0 11 9 0 12.7
  [4,313,-9,0,12.7,-9,0,9.7,0,0,11,9,0,12.7],
// 3 313 9 0 12.7 0 0 11 9 0 9.7
  [3,313,9,0,12.7,0,0,11,9,0,9.7],
// 0 //
// 1 16 9 0 9.7 3 0 0 0 1 0 0 0 3 1-4ndis.dat
  [1,16,9,0,9.7,3,0,0,0,1,0,0,0,3, ldraw_lib__1_4ndis(realsolid)],
// 1 16 9 0 -9.7 0 0 3 0 1 0 -3 0 0 1-4ndis.dat
  [1,16,9,0,-9.7,0,0,3,0,1,0,-3,0,0, ldraw_lib__1_4ndis(realsolid)],
// 1 16 -9 0 -9.7 -3 0 0 0 1 0 0 0 -3 1-4ndis.dat
  [1,16,-9,0,-9.7,-3,0,0,0,1,0,0,0,-3, ldraw_lib__1_4ndis(realsolid)],
// 1 16 -9 0 9.7 0 0 -3 0 1 0 3 0 0 1-4ndis.dat
  [1,16,-9,0,9.7,0,0,-3,0,1,0,3,0,0, ldraw_lib__1_4ndis(realsolid)],
];
module ldraw_lib__s__4616559ps1(step=0, col=false, unit=2/5, alt=false, line=0.2, solid=!$preview)
    makepoly(ldraw_lib__s__4616559ps1(solid), step=step, col=col, unit=unit, alt=alt, line=line, solid=solid);
ldraw_lib__s__4616559ps1(line=0.2);
// file: ../p/box5-12.scad
use <../lib.scad>
$fa=1; $fs=0.2;
function ldraw_lib__box5_12(realsolid=false) = [
// 0 Box with 5 Faces without Any Edges
// 0 Name: box5-12.dat
// 0 Author: Chris Dee [cwdee]
// 0 !LDRAW_ORG Primitive UPDATE 2009-02
// 0 !LICENSE Licensed under CC BY 2.0 and CC BY 4.0 : see CAreadme.txt
// 
// 0 BFC CERTIFY CCW
  [0,"BFC","CERTIFY"],
  [0,"BFC","CCW"],
// 
// 0 !HISTORY 2009-09-03 [PTadmin] Official Update 2009-02
// 
// 
// 4 16 1 1 1 1 1 -1 -1 1 -1 -1 1 1
  [4,16,1,1,1,1,1,-1,-1,1,-1,-1,1,1],
// 4 16 -1 0 1 1 0 1 1 1 1 -1 1 1
  [4,16,-1,0,1,1,0,1,1,1,1,-1,1,1],
// 4 16 -1 0 -1 -1 0 1 -1 1 1 -1 1 -1
  [4,16,-1,0,-1,-1,0,1,-1,1,1,-1,1,-1],
// 4 16 1 0 -1 -1 0 -1 -1 1 -1 1 1 -1
  [4,16,1,0,-1,-1,0,-1,-1,1,-1,1,1,-1],
// 4 16 1 0 1 1 0 -1 1 1 -1 1 1 1
  [4,16,1,0,1,1,0,-1,1,1,-1,1,1,1],
// 0
];
module ldraw_lib__box5_12(step=0, col=false, unit=2/5, alt=false, line=0.2, solid=!$preview)
    makepoly(ldraw_lib__box5_12(solid), step=step, col=col, unit=unit, alt=alt, line=line, solid=solid);
ldraw_lib__box5_12(line=0.2);
// main file
use <../lib.scad>
use <../p/box5-12.scad>
use <s/4616559ps1.scad>
$fa=1; $fs=0.2;
function ldraw_lib__4616559c(realsolid=false) = [
// 0 Sticker  1.8 x  1.8 with Maersk Logo
// 0 Name: 4616559c.dat
// 0 Author: J.C. Tchang [tchang]
// 0 !LDRAW_ORG Part UPDATE 2013-01
// 0 !LICENSE Licensed under CC BY 2.0 and CC BY 4.0 : see CAreadme.txt
// 
// 0 BFC CERTIFY CCW
  [0,"BFC","CERTIFY"],
  [0,"BFC","CCW"],
// 
// 0 !KEYWORDS Set 10219
// 
// 0 !HISTORY 2013-07-21 [PTadmin] Official Update 2013-01
// 
// 
// 1 16 0 -0.25 0 18 0 0 0 0.25 0 0 0 18 box5-12.dat
  [1,16,0,-0.25,0,18,0,0,0,0.25,0,0,0,18, ldraw_lib__box5_12(realsolid)],
// 0 //
// 1 16 0 -0.25 0 1 0 0 0 1 0 0 0 1 s\4616559ps1.dat
  [1,16,0,-0.25,0,1,0,0,0,1,0,0,0,1, ldraw_lib__s__4616559ps1(realsolid)],
// 4 16 9 -0.25 -12.7 -9 -0.25 -12.7 -18 -0.25 -18 18 -0.25 -18
  [4,16,9,-0.25,-12.7,-9,-0.25,-12.7,-18,-0.25,-18,18,-0.25,-18],
// 3 16 -9 -0.25 -12.7 -12 -0.25 -12.7 -18 -0.25 -18
  [3,16,-9,-0.25,-12.7,-12,-0.25,-12.7,-18,-0.25,-18],
// 3 16 -12 -0.25 -9.7 -18 -0.25 -18 -12 -0.25 -12.7
  [3,16,-12,-0.25,-9.7,-18,-0.25,-18,-12,-0.25,-12.7],
// 4 16 -18 -0.25 -18 -12 -0.25 -9.7 -12 -0.25 9.7 -18 -0.25 18
  [4,16,-18,-0.25,-18,-12,-0.25,-9.7,-12,-0.25,9.7,-18,-0.25,18],
// 3 16 -18 -0.25 18 -12 -0.25 9.7 -12 -0.25 12.7
  [3,16,-18,-0.25,18,-12,-0.25,9.7,-12,-0.25,12.7],
// 3 16 -18 -0.25 18 -12 -0.25 12.7 -9 -0.25 12.7
  [3,16,-18,-0.25,18,-12,-0.25,12.7,-9,-0.25,12.7],
// 4 16 -18 -0.25 18 -9 -0.25 12.7 9 -0.25 12.7 18 -0.25 18
  [4,16,-18,-0.25,18,-9,-0.25,12.7,9,-0.25,12.7,18,-0.25,18],
// 3 16 18 -0.25 18 9 -0.25 12.7 12 -0.25 12.7
  [3,16,18,-0.25,18,9,-0.25,12.7,12,-0.25,12.7],
// 3 16 18 -0.25 18 12 -0.25 12.7 12 -0.25 9.7
  [3,16,18,-0.25,18,12,-0.25,12.7,12,-0.25,9.7],
// 4 16 18 -0.25 18 12 -0.25 9.7 12 -0.25 -9.7 18 -0.25 -18
  [4,16,18,-0.25,18,12,-0.25,9.7,12,-0.25,-9.7,18,-0.25,-18],
// 3 16 12 -0.25 -9.7 12 -0.25 -12.7 18 -0.25 -18
  [3,16,12,-0.25,-9.7,12,-0.25,-12.7,18,-0.25,-18],
// 3 16 12 -0.25 -12.7 9 -0.25 -12.7 18 -0.25 -18
  [3,16,12,-0.25,-12.7,9,-0.25,-12.7,18,-0.25,-18],
];
module ldraw_lib__4616559c(step=0, col=false, unit=2/5, alt=false, line=0.2, solid=!$preview)
    makepoly(ldraw_lib__4616559c(solid), step=step, col=col, unit=unit, alt=alt, line=line, solid=solid);
ldraw_lib__4616559c(line=0.2);
